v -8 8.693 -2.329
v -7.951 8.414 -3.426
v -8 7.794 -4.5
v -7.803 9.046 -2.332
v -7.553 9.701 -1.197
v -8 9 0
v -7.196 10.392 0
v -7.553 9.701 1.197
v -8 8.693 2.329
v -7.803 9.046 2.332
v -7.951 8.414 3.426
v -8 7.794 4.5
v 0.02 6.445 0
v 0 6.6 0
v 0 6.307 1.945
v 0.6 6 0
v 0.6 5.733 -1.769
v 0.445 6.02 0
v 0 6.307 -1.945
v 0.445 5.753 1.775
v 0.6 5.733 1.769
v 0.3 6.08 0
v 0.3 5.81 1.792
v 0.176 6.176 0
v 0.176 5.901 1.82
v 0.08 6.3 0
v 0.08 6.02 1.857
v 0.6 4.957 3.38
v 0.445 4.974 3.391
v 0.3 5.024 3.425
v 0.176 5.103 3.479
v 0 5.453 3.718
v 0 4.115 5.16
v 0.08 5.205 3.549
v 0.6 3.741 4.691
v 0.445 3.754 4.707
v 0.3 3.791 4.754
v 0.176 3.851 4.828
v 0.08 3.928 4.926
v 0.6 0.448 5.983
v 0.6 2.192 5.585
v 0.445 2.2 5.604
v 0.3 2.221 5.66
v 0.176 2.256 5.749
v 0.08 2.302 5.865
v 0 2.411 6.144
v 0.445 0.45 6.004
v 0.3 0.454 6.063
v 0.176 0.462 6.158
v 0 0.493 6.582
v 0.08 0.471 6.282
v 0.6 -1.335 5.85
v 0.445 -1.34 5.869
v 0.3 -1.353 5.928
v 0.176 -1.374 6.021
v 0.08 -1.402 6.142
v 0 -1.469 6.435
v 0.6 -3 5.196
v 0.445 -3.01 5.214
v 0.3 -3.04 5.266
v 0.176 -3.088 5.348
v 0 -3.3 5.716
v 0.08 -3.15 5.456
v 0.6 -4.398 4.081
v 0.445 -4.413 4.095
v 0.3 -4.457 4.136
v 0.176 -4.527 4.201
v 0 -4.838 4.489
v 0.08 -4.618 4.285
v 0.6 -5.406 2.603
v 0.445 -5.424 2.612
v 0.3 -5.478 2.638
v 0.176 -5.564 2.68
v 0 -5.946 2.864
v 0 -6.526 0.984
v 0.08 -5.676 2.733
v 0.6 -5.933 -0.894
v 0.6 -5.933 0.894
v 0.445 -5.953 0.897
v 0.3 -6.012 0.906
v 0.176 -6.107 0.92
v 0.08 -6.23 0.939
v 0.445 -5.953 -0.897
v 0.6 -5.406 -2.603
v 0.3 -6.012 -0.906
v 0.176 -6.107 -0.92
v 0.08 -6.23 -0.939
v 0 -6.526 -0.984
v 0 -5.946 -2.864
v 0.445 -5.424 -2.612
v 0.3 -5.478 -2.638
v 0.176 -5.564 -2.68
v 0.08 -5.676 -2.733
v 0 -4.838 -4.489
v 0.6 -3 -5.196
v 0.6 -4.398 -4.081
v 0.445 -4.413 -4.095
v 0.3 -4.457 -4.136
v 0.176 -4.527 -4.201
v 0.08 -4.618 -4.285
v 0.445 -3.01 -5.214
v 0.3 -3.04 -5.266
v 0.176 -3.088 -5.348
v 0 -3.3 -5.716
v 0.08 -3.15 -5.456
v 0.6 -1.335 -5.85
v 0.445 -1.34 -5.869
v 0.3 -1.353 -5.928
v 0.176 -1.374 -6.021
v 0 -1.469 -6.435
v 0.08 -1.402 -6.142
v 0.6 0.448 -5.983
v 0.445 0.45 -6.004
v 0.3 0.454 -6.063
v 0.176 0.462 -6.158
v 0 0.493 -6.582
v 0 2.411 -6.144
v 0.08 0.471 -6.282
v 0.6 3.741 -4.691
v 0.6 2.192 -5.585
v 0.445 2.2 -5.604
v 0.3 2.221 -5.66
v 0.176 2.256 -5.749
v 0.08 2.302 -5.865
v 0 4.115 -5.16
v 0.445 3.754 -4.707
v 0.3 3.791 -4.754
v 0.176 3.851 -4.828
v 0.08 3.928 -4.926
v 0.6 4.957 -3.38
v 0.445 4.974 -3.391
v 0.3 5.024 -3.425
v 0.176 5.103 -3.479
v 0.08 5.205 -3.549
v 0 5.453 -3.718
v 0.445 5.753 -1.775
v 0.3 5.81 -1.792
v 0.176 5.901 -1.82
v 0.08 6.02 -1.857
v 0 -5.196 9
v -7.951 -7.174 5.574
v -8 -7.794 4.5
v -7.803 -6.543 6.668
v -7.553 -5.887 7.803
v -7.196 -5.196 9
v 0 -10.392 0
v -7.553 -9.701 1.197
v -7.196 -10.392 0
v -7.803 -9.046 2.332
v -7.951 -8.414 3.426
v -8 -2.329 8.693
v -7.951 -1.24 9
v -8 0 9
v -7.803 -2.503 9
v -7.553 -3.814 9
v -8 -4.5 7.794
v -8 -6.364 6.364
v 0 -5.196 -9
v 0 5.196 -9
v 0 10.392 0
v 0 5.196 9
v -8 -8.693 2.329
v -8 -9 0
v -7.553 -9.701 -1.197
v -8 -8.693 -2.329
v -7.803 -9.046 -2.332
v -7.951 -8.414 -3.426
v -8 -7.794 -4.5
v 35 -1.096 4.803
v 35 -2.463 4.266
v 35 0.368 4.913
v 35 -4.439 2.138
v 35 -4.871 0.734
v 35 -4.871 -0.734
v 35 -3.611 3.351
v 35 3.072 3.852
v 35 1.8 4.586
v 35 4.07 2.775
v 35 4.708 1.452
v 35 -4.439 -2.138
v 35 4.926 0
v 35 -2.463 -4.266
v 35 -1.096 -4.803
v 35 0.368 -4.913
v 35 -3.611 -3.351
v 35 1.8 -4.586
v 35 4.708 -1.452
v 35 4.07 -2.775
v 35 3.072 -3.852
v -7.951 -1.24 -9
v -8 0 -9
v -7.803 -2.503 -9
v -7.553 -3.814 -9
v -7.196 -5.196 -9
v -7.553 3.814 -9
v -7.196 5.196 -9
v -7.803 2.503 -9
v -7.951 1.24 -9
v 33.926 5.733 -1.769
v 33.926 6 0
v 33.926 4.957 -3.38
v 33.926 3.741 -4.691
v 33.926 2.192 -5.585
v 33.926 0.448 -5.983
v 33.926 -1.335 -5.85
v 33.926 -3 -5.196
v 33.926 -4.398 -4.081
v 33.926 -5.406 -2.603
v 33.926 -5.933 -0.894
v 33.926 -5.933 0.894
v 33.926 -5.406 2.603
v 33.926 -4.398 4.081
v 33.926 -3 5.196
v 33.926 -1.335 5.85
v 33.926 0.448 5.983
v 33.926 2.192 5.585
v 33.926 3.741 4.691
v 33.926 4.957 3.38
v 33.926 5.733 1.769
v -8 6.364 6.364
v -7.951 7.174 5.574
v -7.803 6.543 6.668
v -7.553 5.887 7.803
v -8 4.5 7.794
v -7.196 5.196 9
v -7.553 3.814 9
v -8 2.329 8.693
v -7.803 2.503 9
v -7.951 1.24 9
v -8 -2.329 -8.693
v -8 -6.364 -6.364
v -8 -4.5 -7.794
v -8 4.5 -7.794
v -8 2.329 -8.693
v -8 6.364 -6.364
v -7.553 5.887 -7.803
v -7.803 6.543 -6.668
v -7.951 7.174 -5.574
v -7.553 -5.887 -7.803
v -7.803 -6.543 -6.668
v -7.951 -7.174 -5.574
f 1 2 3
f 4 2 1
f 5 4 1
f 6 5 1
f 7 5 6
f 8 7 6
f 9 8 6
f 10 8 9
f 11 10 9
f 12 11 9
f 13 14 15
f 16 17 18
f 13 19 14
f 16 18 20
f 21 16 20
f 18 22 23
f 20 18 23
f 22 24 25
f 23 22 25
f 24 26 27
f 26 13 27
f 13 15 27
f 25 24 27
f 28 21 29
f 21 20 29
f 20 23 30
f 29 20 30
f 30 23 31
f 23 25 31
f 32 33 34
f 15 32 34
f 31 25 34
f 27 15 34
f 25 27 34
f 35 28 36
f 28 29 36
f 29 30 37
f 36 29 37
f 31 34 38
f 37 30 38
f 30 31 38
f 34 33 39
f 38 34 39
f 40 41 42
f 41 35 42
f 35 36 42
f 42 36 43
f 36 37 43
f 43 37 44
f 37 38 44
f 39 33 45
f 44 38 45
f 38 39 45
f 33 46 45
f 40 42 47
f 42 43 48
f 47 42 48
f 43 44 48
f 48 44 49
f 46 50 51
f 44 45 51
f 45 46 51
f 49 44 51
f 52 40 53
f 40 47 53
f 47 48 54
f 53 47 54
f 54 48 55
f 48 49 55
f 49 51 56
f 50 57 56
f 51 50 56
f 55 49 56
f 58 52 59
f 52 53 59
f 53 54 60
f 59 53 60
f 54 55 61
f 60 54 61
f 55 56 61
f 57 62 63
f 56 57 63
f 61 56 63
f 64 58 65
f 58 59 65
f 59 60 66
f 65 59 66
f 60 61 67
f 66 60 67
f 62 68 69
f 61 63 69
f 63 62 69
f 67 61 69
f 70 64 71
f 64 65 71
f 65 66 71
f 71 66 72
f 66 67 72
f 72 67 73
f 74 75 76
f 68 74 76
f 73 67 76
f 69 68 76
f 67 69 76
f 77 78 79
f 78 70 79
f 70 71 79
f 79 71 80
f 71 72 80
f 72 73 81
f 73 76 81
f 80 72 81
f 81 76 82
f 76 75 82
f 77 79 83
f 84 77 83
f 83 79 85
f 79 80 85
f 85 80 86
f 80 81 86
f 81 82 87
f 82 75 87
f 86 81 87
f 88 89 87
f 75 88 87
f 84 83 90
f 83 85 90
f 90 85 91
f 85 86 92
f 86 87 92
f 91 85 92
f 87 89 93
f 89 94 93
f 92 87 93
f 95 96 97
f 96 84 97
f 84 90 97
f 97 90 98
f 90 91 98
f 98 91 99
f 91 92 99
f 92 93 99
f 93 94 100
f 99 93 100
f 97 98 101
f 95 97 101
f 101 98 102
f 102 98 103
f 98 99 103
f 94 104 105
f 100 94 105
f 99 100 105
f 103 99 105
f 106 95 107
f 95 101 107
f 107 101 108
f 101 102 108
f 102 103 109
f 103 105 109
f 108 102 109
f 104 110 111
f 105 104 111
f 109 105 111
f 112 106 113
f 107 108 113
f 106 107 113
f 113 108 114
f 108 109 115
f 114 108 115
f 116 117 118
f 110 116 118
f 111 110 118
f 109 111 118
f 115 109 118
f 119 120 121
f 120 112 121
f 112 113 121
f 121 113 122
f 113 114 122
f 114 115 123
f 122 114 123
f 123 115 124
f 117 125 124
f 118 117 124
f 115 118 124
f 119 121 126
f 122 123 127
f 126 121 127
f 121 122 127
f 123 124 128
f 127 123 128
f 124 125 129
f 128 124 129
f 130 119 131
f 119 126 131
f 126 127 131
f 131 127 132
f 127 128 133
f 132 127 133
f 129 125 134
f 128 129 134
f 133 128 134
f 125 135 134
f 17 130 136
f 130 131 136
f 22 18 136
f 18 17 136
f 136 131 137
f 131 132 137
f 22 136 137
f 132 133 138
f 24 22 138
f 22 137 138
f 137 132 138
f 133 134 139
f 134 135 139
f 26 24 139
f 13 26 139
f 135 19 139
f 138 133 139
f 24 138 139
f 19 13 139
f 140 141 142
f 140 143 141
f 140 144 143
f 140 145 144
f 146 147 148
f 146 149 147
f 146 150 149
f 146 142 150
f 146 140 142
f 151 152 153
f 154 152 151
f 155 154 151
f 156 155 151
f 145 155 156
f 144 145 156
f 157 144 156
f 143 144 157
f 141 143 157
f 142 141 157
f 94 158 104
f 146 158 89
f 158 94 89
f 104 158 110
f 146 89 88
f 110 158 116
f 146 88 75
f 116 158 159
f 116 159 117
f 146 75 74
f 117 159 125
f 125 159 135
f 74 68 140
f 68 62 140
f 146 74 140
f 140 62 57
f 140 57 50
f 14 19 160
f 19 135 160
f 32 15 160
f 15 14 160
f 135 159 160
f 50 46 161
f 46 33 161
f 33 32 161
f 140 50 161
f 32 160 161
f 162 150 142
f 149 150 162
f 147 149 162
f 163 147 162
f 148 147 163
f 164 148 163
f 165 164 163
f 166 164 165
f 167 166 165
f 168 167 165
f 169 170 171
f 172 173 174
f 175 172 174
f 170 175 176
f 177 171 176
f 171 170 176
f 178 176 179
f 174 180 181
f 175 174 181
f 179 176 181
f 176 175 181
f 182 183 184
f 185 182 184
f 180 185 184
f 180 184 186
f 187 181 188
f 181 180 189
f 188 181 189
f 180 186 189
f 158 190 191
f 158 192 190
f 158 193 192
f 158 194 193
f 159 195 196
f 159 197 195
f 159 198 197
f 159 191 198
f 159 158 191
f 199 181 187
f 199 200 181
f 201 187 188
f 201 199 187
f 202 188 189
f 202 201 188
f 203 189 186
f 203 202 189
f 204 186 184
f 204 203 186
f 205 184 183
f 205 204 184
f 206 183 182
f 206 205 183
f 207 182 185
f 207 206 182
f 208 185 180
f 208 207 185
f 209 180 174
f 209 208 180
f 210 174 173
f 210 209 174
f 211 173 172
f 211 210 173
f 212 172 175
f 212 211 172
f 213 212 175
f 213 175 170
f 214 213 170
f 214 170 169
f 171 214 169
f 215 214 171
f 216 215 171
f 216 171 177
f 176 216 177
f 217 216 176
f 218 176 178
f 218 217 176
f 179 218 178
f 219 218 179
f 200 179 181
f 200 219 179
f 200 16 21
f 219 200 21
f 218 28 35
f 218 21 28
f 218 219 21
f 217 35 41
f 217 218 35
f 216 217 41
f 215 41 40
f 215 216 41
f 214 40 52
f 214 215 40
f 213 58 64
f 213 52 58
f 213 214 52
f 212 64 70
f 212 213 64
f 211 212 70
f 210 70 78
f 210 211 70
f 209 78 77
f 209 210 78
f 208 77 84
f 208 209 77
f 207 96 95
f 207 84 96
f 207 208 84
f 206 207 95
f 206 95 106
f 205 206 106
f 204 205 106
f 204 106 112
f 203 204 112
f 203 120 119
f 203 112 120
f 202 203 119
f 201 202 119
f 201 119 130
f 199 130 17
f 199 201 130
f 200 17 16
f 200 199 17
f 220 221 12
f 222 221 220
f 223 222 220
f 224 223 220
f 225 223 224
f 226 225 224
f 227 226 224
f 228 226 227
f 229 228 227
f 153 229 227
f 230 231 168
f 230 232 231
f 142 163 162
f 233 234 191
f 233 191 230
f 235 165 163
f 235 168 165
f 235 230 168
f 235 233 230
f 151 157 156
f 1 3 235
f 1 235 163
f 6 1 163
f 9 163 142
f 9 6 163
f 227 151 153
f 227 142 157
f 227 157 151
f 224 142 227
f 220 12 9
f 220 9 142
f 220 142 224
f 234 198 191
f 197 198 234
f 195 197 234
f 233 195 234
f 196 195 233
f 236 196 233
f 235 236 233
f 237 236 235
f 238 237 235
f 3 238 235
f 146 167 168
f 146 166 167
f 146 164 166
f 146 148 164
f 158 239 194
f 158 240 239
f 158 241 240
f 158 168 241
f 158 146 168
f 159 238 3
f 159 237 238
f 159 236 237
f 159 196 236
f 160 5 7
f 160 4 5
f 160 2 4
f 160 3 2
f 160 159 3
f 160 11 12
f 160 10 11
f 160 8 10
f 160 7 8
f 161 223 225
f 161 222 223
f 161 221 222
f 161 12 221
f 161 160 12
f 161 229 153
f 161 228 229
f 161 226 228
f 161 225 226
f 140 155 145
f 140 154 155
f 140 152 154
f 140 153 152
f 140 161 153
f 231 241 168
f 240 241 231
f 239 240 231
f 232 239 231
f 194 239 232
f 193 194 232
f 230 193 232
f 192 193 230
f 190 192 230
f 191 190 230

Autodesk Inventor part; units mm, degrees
ref_plane "YZ Plane" through (0, 0, 0) normal (1, 0, 0) x (0, 1, 0)
ref_plane "XZ Plane" through (0, 0, 0) normal (0, 1, 0) x (-1, 0, 0)
sketch "Skizze1" plane through (0, 0, 0) normal (0, 0, 1) x (1, 0, 0)
  line L0 (0, 6) -> (35, 6)
  line L1 (35, 6) -> (35, 0)
  line L2 (35, 0) -> (0, 0)
  line L3 (-7, 0) -> (42, 0) projected
  line L4 (0, -1.2) -> (0, 7.2) projected
  line L5 (0, 6) -> (0, 0)
  dimension "d2" = 12
  dimension "d59" = 35
revolve "Körper" add sketch "Skizze1" angle 360 about axis through (35, 0, 0) along (-1, 0, 0)
sketch "Skizze2" plane through (0, 0, 0) normal (-1, 0, 0) x (0, 0, 1)
  line L0 (0, 10.3923) -> (9, 5.1962)
  line L1 (9, 5.1962) -> (9, -5.1962)
  line L2 (9, -5.1962) -> (0, -10.3923)
  line L3 (0, -10.3923) -> (-9, -5.1962)
  line L4 (-9, -5.1962) -> (-9, 5.1962)
  line L5 (-9, 5.1962) -> (0, 10.3923)
  line L6 (-12.6, 0) -> (12.6, 0) projected
  line L7 (0, 14.5492) -> (0, -14.5492) projected
  point P0 (0, 0)
  point P1 (0, 0)
  dimension "d11" = 18
extrude "Kopf" add sketch "Skizze2" along normal blind 8
sketch "Skizze4" plane through (0, 0, 0) normal (0, 0, 1) x (1, 0, 0)
  line L0 (-6.9608, 10.8) -> (-8, 9)
  line L1 (-1.1, 0) -> (-0.234, 0)
  line L2 (-9.5532, 0) -> (1.3192, 0) projected
  line L3 (-8, 10.8) -> (-6.9608, 10.8)
  line L4 (-8, 9) -> (-8, 10.8)
  line L5 (0, 12.96) -> (0, -2.16) projected
  dimension "d65" = 18
  dimension "d67" = 30
  dimension "d68" = 21.6
  dimension "d69" = 8
revolve "Fase1" cut sketch "Skizze4" angle 360 about axis through (-1.1, 0, 0) along (1, 0, 0)
thread "Gewinde" size "M12x1.75" class "6g" standard "ISO Metric profile" length 20.5
chamfer "Fase2" distance 1.0735 distance2 1.0736 1 edges at (35, -6, 0) measured on face at (35, -1.5551, -0.8476)
fillet "Fillet2" radius 0.6 1 edges at (0, -6, 0)
ref_plane "Work Plane1" through (1.525, 0, 0) normal (0, 0, 1) x (1, 0, 0)
equation "\"d71\" = RR"
equation "\"d11\" = SW"
equation "\"d3\" = KOH"
equation "\"d6\" = -0.5 * SPD + 0.5 * GD"
equation "\"d15\" = GEL"
equation "\"d2\" = GD"
equation "\"d59\" = NLG"
equation "\"d65\" = SW"
equation "\"d67\" = ANG1"
equation "\"d68\" = 1.2 * SW"
equation "\"d69\" = KOH"
equation "\"NLG\" = 35"
equation "\"GD\" = NND"
equation "\"BDM\" = NND"
equation "\"KOH\" = 8"
equation "\"GEL\" = 20.5"
equation "\"SW\" = 18"
equation "\"SW0\" = SW"
equation "\"SPD\" = NND - 1.2269 * PTC"
equation "\"SD2\" = NND"
equation "\"SD\" = 0"
equation "\"ANG1\" = 30deg"
equation "\"GAL\" = 0.61345 * PTC"
equation "\"GUL\" = 0.61345 * PTC"
equation "\"RR\" = 0.6"
equation "\"RR1\" = 0.1"
equation "\"GD1\" = THREADDIA - 1.2269 * PTC"
equation "\"THREADDIA\" = 12"
equation "\"SDH\" = NND"
equation "\"TOA\" = 30deg"
equation "\"PTC\" = 1.75"
equation "\"NND\" = 12"
equation "\"E0\" = 1.155 * SW"
equation "\"K1\" = 5.28"
properties part number "DIN 7990 - M12 x 35" material "Stahl, weich"
